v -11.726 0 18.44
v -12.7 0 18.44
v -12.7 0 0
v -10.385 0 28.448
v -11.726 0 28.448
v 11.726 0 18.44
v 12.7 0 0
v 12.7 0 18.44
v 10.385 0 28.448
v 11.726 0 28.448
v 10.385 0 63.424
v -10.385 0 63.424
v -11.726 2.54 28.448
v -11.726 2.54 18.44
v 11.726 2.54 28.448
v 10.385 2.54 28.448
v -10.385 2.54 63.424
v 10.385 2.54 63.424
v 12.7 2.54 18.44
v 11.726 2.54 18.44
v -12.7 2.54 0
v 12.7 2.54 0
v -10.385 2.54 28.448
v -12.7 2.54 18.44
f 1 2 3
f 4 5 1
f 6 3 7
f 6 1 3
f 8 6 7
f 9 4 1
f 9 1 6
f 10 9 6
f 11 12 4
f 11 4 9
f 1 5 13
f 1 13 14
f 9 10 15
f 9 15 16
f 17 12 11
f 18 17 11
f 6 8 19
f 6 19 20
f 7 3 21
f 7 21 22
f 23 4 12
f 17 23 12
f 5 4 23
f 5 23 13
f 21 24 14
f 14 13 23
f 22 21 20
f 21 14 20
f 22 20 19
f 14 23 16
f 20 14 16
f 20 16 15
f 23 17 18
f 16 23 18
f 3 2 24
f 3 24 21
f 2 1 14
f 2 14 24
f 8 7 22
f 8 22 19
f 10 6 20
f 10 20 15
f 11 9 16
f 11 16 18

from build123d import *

# Parameters (mm, degrees)
F0_W     = 20.769432
F0_H     = 34.9758
F1_DEPTH = 2.54


with BuildPart() as f1:
    # F0 (on Front) → F1 (new body)
    with BuildSketch(Plane.XZ):
        Polygon((-12.7, 0), (0, 0), (12.7, 0), (12.7, 9.4996), (-12.7, 9.4996), align=None)
        Polygon((-12.7, 18.4404), (-12.7, 9.4996), (12.7, 9.4996), (12.7, 18.4404), (11.725585, 18.4404), (-11.725585, 18.4404), align=None)
        Polygon((-11.725585, 28.448), (-11.725585, 18.4404), (11.725585, 18.4404), (11.725585, 28.448), (10.384716, 28.448), (-10.384716, 28.448), align=None)
        with Locations((0, 45.9359)):
            Rectangle(F0_W, F0_H)
    extrude(amount=-F1_DEPTH)


solid = f1.part
